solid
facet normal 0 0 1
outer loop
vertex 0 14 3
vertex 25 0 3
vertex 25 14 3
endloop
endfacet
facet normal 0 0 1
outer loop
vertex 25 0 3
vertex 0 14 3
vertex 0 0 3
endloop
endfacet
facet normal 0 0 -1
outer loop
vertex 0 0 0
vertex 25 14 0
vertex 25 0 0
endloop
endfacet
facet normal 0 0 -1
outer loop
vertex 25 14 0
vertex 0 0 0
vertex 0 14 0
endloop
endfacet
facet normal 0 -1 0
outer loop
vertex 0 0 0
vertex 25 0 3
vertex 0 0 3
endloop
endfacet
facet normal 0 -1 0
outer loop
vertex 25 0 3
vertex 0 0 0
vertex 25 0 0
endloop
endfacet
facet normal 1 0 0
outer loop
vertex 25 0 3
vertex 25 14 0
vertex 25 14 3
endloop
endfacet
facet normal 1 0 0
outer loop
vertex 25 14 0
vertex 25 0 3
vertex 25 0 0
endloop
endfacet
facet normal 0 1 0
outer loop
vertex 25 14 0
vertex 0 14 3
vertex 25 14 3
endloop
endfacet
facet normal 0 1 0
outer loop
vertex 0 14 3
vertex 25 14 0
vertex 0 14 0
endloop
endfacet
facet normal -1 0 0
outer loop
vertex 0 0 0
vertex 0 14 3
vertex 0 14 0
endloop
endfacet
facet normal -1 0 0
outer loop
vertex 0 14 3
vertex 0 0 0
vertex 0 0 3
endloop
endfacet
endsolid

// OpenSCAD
$fn=360;
//67x93x22
x=25;
y=14;
z=3;
  translate([0,0,0])
  cube([x,y,z]);
